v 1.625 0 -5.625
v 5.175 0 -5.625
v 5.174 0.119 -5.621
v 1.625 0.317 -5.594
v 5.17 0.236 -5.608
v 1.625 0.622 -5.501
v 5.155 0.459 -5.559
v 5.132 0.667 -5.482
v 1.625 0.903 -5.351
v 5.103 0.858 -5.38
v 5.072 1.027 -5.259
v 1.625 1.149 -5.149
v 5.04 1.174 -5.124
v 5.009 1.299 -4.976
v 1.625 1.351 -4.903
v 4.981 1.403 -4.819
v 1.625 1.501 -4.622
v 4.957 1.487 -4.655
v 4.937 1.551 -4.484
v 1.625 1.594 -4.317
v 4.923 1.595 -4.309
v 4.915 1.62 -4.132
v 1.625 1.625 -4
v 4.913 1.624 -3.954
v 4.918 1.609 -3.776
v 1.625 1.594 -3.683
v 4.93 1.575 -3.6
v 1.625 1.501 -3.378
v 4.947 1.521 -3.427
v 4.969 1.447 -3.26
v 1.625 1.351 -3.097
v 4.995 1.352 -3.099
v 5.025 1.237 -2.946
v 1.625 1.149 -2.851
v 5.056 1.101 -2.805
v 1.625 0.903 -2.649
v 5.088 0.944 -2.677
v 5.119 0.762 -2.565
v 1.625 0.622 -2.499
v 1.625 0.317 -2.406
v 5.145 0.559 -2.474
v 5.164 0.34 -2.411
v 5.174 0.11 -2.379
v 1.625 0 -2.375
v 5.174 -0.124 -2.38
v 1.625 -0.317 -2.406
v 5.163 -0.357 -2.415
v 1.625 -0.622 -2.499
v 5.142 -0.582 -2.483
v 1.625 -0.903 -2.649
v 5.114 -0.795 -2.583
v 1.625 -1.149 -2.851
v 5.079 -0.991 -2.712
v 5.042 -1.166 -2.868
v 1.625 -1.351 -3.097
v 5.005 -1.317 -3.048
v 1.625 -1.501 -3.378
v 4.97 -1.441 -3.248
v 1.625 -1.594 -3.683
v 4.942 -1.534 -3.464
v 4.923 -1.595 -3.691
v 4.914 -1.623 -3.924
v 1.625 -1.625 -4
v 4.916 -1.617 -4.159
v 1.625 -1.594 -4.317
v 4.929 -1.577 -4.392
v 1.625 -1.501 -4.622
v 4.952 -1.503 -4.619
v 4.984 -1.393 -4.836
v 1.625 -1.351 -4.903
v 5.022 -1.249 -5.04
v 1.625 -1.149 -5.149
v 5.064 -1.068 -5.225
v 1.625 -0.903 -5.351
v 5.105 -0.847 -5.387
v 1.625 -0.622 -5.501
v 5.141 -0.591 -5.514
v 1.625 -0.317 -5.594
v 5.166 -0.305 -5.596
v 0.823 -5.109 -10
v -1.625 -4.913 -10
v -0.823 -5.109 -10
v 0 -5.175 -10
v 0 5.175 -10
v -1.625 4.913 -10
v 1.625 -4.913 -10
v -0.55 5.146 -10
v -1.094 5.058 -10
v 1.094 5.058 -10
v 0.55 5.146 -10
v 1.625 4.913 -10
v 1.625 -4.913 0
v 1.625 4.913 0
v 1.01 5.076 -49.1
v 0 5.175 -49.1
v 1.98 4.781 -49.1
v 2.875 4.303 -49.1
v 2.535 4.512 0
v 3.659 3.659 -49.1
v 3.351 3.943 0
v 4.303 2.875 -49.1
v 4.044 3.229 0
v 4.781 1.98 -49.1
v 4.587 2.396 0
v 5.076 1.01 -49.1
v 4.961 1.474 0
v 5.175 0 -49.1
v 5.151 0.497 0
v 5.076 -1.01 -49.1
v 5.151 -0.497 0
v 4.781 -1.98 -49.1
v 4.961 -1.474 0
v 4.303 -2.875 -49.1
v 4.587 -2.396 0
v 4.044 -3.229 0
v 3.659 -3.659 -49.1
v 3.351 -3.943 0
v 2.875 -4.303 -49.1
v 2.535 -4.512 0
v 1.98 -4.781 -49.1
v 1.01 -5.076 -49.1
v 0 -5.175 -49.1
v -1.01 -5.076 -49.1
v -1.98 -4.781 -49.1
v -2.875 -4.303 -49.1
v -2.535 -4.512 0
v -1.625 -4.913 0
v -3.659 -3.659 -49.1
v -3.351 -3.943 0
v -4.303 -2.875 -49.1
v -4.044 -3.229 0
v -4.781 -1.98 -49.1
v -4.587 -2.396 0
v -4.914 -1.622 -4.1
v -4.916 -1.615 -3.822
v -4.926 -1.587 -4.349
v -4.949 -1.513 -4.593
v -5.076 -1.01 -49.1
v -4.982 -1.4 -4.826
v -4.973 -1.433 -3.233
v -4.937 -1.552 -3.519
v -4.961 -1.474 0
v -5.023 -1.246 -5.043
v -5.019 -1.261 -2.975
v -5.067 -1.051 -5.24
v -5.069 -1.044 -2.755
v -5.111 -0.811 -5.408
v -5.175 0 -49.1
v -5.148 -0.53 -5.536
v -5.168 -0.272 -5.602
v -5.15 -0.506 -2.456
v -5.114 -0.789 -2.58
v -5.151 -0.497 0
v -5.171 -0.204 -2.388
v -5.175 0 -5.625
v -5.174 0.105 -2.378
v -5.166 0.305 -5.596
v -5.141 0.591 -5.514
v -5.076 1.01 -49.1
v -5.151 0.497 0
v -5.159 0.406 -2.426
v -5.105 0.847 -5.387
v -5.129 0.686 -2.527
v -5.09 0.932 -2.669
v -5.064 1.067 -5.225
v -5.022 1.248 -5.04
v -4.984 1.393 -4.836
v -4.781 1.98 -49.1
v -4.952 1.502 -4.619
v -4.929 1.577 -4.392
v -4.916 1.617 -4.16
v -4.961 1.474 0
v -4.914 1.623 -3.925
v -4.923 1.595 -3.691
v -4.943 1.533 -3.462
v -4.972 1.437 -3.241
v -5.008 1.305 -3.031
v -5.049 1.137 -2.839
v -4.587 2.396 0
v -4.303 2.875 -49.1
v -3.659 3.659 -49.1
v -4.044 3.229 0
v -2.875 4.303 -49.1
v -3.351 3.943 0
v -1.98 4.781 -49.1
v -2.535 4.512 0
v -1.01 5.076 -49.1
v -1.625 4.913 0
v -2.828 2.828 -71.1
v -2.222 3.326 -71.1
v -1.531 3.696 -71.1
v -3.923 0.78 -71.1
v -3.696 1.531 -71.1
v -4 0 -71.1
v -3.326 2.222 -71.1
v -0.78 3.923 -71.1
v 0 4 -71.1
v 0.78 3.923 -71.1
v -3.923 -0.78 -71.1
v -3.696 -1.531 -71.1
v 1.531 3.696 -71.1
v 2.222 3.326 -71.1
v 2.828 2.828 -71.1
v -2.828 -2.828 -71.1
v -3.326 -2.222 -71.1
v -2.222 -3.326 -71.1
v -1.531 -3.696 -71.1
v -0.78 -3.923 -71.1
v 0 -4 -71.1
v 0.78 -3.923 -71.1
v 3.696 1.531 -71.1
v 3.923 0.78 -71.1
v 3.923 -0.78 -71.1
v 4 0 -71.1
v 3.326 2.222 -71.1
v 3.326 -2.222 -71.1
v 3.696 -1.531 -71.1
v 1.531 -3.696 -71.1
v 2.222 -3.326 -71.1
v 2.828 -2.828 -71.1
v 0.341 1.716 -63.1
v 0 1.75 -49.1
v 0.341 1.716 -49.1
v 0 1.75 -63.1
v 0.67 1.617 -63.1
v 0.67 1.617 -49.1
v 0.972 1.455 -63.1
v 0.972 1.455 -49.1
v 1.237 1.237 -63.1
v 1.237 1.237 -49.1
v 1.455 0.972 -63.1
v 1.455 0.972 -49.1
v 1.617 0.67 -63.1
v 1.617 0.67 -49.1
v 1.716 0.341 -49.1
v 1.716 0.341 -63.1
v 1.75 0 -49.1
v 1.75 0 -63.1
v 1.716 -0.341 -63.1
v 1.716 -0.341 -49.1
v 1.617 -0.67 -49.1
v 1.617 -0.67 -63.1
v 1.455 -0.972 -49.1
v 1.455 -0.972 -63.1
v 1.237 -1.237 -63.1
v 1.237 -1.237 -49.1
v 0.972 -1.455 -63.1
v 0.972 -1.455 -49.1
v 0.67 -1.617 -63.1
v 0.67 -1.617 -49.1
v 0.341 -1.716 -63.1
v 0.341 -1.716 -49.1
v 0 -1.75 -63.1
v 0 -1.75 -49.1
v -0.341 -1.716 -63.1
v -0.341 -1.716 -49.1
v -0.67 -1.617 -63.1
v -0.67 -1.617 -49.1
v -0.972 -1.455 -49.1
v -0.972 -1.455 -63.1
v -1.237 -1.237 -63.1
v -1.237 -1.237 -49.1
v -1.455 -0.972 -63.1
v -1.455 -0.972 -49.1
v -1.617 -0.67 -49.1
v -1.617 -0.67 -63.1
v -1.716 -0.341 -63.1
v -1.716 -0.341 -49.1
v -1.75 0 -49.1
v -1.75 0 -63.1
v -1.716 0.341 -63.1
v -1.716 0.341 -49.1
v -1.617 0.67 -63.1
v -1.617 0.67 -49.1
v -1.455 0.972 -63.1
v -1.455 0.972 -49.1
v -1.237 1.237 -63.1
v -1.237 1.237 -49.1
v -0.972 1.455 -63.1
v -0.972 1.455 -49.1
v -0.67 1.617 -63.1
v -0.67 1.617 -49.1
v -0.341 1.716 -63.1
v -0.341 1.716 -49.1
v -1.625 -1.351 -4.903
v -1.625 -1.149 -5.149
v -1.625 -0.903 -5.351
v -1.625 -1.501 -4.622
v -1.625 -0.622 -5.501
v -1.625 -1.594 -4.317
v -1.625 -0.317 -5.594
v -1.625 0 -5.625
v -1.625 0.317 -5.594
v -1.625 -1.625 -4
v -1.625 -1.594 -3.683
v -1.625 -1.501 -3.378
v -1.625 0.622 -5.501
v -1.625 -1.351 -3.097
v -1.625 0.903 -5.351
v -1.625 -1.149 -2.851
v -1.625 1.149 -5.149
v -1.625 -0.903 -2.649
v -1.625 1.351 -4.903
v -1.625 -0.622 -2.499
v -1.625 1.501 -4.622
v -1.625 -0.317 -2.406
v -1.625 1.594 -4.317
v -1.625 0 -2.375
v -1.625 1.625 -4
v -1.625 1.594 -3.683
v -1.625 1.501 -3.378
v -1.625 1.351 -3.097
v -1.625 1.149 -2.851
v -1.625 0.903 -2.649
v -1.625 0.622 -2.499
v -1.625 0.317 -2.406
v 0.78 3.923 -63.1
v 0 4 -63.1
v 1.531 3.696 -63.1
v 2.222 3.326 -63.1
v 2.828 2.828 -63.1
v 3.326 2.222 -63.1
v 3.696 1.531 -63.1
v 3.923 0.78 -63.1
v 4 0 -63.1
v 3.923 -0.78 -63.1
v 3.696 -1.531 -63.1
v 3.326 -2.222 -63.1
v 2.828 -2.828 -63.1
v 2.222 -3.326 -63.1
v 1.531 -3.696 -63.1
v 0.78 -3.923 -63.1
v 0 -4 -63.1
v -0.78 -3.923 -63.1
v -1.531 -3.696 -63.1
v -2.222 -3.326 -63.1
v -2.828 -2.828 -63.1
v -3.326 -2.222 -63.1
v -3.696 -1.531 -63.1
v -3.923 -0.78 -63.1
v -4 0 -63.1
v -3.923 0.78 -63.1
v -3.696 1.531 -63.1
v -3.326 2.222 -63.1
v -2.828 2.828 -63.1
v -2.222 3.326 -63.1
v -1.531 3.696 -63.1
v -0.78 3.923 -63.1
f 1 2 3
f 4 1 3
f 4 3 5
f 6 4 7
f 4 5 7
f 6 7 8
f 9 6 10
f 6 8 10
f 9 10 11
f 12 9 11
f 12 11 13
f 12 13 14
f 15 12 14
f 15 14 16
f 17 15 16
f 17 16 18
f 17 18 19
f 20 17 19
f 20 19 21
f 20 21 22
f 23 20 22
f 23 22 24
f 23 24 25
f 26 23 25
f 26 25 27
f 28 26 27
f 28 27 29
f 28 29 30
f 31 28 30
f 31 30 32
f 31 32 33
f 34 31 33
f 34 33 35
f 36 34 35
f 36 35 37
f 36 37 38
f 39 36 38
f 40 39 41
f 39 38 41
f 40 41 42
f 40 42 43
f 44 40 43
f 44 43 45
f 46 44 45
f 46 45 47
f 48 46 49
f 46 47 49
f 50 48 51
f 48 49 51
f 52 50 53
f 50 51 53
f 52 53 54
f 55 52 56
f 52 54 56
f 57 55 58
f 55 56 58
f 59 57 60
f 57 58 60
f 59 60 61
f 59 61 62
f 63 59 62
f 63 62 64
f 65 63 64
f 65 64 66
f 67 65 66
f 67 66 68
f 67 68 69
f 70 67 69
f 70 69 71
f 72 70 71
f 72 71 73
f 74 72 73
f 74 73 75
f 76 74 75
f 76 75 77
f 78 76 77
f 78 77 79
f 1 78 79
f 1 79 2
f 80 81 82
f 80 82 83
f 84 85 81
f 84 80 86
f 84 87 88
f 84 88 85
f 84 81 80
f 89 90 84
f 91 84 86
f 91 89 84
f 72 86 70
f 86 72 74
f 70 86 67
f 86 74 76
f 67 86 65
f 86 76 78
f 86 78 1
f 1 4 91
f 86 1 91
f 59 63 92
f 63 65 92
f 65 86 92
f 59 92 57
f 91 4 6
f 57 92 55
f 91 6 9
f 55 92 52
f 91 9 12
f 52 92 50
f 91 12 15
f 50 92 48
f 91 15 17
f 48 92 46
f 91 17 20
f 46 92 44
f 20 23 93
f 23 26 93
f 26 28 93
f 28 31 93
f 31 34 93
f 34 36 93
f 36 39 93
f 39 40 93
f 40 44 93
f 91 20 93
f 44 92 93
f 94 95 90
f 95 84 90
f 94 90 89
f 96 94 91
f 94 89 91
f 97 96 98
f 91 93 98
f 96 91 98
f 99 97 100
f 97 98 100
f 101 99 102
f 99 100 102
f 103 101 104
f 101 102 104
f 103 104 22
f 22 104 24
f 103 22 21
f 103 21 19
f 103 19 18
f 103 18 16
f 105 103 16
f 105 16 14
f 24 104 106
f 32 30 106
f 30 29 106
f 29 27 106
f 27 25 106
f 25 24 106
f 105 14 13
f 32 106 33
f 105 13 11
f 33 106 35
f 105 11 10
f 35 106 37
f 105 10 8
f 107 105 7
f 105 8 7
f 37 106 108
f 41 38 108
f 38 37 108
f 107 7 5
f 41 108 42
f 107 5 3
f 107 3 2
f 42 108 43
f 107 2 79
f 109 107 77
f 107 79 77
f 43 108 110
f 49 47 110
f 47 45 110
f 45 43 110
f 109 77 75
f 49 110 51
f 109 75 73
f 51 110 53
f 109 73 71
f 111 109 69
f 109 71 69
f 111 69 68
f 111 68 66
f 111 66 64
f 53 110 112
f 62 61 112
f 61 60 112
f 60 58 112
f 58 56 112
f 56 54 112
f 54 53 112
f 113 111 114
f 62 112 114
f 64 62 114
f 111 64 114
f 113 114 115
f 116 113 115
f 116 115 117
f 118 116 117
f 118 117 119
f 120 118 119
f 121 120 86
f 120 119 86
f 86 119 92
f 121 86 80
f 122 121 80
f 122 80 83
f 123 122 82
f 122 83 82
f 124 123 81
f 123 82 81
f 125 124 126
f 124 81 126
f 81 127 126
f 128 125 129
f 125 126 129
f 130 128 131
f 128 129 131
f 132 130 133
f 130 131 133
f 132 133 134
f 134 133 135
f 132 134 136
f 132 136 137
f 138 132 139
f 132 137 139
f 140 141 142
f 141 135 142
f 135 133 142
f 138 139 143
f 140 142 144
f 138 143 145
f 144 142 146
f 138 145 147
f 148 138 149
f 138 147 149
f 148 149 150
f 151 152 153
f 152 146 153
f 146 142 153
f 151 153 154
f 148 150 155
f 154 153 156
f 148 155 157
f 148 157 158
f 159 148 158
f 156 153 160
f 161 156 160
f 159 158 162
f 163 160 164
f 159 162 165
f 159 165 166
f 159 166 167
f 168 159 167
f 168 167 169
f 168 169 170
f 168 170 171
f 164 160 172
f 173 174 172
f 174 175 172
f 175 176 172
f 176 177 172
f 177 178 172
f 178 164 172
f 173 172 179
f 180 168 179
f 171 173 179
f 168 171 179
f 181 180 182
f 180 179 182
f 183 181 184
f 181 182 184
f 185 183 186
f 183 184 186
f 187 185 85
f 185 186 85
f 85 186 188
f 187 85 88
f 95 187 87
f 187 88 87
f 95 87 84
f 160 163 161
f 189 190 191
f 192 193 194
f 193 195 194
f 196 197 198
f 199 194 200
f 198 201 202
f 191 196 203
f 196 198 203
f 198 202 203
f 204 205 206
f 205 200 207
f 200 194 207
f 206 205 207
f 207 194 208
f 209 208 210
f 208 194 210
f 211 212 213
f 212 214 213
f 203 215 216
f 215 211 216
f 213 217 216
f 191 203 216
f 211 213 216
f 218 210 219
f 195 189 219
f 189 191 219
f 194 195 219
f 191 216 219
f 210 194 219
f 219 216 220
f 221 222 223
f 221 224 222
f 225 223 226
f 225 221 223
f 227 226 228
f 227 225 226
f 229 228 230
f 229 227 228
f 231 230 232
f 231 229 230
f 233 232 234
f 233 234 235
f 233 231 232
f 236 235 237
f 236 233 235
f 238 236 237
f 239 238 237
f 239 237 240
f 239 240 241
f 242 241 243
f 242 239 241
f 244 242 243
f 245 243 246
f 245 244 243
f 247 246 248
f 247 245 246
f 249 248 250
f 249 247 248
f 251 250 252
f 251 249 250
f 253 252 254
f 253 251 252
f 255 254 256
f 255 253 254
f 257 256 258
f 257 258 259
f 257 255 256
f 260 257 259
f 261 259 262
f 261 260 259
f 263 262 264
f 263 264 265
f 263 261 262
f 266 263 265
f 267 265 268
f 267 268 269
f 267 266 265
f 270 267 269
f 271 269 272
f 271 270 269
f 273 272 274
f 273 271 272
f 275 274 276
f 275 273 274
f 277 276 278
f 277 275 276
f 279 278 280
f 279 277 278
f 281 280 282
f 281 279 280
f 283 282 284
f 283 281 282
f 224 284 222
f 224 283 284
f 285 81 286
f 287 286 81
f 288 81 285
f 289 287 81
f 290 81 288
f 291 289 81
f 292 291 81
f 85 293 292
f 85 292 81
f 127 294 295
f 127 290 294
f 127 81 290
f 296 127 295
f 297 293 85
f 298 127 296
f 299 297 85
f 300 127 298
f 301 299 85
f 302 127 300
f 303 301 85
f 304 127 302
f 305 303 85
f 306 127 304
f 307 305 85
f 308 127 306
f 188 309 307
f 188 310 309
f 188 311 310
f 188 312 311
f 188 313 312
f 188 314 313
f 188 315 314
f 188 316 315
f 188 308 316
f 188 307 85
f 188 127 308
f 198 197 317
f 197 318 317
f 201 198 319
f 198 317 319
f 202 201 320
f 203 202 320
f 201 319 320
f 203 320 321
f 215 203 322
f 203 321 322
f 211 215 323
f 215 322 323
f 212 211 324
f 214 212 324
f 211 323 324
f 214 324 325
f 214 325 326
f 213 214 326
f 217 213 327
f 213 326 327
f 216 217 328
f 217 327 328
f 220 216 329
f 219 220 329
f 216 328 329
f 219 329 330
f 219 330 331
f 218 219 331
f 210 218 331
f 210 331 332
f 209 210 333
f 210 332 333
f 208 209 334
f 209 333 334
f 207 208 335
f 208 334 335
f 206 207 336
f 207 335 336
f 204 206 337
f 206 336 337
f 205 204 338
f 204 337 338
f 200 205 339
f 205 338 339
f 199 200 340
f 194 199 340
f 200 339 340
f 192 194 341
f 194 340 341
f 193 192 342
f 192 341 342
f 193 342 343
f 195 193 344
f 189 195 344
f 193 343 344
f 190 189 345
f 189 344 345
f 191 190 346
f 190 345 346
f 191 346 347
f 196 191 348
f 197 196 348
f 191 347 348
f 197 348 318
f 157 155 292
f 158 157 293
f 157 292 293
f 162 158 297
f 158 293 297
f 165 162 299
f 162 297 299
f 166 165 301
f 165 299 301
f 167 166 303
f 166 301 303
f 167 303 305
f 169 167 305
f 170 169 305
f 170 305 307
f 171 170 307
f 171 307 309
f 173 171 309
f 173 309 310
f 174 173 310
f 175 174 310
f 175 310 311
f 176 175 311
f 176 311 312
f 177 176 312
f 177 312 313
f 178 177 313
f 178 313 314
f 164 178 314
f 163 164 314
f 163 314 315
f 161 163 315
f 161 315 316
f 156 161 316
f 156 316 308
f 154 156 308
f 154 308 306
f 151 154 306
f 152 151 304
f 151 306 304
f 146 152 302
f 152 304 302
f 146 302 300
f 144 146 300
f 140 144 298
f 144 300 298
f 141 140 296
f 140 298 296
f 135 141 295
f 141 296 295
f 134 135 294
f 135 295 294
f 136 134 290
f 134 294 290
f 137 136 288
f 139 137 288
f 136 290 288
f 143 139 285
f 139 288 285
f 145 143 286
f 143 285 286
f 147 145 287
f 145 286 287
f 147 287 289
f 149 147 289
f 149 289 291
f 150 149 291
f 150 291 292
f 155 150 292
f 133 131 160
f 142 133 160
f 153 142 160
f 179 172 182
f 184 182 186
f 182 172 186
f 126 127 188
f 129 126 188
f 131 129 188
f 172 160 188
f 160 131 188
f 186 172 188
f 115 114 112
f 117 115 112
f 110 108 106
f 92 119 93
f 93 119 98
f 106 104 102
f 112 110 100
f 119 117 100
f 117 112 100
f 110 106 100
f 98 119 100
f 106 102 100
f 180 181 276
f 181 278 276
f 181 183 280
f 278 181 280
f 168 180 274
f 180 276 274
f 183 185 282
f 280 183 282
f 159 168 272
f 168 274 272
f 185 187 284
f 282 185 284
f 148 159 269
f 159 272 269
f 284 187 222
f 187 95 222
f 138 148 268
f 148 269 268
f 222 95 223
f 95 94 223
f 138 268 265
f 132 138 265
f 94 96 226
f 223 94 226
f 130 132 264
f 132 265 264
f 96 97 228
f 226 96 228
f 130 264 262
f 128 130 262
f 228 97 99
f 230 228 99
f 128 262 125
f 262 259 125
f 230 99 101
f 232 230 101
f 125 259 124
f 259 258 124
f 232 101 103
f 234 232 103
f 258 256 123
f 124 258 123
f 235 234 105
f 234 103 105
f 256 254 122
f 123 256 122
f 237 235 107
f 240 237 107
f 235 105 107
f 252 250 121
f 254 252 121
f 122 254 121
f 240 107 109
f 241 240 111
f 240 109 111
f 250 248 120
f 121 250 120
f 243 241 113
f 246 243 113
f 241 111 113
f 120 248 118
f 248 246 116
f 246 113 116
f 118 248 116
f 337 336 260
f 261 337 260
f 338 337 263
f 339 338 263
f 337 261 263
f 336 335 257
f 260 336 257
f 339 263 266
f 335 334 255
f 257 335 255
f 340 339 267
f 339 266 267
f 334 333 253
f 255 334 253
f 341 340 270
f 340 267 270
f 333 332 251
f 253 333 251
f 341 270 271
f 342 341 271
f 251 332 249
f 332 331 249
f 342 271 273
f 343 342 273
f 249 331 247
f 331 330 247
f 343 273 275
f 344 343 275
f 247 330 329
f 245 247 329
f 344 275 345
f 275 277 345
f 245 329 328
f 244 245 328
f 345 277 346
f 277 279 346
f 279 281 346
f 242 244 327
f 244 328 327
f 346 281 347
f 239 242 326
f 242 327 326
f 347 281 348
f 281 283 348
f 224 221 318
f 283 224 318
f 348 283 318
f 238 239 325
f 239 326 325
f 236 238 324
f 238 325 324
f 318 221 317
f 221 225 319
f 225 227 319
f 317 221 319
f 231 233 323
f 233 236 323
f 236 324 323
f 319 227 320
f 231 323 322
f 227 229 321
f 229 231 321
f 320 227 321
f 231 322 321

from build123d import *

# Parameters (mm, degrees)
SKETCH1_W          = 14
SKETCH1_H          = 1.75
SKETCH4_W          = 3.25
SKETCH4_H          = 11
CUT_EXTRUDE1_DEPTH = 10
SKETCH5_R          = 1.625
CUT_EXTRUDE2_DEPTH = 12


with BuildPart() as part:
    # Sketch1 → Revolve1 (revolve)
    with BuildSketch(Plane(origin=(0, 0, 0), x_dir=(0, 0, -1), z_dir=(1, 0, 0))):
        Polygon((0, 5.175), (0, 0), (49.1, 0), (49.1, 1.75), (49.1, 5.175), align=None)
        with Locations((56.1, 0.875)):
            Rectangle(SKETCH1_W, SKETCH1_H)
        Polygon((63.1, 1.75), (63.1, 0), (71.1, 0), (71.1, 4), (63.1, 4), align=None)
    revolve(axis=Axis((0, 0, -49.1), (0, 0, -1)))

    # Sketch4 → Cut-Extrude1 (cut)
    with BuildSketch(Plane.XY):
        Rectangle(SKETCH4_W, SKETCH4_H)
    extrude(amount=-CUT_EXTRUDE1_DEPTH, mode=Mode.SUBTRACT)

    # Sketch5 → Cut-Extrude2 (cut)
    with BuildSketch(Plane(origin=(5.175, 0, 0), x_dir=(0, 0, -1), z_dir=(1, 0, 0))):
        with Locations((4, 0)):
            Circle(SKETCH5_R)
    extrude(amount=-CUT_EXTRUDE2_DEPTH, mode=Mode.SUBTRACT)


solid = part.part
